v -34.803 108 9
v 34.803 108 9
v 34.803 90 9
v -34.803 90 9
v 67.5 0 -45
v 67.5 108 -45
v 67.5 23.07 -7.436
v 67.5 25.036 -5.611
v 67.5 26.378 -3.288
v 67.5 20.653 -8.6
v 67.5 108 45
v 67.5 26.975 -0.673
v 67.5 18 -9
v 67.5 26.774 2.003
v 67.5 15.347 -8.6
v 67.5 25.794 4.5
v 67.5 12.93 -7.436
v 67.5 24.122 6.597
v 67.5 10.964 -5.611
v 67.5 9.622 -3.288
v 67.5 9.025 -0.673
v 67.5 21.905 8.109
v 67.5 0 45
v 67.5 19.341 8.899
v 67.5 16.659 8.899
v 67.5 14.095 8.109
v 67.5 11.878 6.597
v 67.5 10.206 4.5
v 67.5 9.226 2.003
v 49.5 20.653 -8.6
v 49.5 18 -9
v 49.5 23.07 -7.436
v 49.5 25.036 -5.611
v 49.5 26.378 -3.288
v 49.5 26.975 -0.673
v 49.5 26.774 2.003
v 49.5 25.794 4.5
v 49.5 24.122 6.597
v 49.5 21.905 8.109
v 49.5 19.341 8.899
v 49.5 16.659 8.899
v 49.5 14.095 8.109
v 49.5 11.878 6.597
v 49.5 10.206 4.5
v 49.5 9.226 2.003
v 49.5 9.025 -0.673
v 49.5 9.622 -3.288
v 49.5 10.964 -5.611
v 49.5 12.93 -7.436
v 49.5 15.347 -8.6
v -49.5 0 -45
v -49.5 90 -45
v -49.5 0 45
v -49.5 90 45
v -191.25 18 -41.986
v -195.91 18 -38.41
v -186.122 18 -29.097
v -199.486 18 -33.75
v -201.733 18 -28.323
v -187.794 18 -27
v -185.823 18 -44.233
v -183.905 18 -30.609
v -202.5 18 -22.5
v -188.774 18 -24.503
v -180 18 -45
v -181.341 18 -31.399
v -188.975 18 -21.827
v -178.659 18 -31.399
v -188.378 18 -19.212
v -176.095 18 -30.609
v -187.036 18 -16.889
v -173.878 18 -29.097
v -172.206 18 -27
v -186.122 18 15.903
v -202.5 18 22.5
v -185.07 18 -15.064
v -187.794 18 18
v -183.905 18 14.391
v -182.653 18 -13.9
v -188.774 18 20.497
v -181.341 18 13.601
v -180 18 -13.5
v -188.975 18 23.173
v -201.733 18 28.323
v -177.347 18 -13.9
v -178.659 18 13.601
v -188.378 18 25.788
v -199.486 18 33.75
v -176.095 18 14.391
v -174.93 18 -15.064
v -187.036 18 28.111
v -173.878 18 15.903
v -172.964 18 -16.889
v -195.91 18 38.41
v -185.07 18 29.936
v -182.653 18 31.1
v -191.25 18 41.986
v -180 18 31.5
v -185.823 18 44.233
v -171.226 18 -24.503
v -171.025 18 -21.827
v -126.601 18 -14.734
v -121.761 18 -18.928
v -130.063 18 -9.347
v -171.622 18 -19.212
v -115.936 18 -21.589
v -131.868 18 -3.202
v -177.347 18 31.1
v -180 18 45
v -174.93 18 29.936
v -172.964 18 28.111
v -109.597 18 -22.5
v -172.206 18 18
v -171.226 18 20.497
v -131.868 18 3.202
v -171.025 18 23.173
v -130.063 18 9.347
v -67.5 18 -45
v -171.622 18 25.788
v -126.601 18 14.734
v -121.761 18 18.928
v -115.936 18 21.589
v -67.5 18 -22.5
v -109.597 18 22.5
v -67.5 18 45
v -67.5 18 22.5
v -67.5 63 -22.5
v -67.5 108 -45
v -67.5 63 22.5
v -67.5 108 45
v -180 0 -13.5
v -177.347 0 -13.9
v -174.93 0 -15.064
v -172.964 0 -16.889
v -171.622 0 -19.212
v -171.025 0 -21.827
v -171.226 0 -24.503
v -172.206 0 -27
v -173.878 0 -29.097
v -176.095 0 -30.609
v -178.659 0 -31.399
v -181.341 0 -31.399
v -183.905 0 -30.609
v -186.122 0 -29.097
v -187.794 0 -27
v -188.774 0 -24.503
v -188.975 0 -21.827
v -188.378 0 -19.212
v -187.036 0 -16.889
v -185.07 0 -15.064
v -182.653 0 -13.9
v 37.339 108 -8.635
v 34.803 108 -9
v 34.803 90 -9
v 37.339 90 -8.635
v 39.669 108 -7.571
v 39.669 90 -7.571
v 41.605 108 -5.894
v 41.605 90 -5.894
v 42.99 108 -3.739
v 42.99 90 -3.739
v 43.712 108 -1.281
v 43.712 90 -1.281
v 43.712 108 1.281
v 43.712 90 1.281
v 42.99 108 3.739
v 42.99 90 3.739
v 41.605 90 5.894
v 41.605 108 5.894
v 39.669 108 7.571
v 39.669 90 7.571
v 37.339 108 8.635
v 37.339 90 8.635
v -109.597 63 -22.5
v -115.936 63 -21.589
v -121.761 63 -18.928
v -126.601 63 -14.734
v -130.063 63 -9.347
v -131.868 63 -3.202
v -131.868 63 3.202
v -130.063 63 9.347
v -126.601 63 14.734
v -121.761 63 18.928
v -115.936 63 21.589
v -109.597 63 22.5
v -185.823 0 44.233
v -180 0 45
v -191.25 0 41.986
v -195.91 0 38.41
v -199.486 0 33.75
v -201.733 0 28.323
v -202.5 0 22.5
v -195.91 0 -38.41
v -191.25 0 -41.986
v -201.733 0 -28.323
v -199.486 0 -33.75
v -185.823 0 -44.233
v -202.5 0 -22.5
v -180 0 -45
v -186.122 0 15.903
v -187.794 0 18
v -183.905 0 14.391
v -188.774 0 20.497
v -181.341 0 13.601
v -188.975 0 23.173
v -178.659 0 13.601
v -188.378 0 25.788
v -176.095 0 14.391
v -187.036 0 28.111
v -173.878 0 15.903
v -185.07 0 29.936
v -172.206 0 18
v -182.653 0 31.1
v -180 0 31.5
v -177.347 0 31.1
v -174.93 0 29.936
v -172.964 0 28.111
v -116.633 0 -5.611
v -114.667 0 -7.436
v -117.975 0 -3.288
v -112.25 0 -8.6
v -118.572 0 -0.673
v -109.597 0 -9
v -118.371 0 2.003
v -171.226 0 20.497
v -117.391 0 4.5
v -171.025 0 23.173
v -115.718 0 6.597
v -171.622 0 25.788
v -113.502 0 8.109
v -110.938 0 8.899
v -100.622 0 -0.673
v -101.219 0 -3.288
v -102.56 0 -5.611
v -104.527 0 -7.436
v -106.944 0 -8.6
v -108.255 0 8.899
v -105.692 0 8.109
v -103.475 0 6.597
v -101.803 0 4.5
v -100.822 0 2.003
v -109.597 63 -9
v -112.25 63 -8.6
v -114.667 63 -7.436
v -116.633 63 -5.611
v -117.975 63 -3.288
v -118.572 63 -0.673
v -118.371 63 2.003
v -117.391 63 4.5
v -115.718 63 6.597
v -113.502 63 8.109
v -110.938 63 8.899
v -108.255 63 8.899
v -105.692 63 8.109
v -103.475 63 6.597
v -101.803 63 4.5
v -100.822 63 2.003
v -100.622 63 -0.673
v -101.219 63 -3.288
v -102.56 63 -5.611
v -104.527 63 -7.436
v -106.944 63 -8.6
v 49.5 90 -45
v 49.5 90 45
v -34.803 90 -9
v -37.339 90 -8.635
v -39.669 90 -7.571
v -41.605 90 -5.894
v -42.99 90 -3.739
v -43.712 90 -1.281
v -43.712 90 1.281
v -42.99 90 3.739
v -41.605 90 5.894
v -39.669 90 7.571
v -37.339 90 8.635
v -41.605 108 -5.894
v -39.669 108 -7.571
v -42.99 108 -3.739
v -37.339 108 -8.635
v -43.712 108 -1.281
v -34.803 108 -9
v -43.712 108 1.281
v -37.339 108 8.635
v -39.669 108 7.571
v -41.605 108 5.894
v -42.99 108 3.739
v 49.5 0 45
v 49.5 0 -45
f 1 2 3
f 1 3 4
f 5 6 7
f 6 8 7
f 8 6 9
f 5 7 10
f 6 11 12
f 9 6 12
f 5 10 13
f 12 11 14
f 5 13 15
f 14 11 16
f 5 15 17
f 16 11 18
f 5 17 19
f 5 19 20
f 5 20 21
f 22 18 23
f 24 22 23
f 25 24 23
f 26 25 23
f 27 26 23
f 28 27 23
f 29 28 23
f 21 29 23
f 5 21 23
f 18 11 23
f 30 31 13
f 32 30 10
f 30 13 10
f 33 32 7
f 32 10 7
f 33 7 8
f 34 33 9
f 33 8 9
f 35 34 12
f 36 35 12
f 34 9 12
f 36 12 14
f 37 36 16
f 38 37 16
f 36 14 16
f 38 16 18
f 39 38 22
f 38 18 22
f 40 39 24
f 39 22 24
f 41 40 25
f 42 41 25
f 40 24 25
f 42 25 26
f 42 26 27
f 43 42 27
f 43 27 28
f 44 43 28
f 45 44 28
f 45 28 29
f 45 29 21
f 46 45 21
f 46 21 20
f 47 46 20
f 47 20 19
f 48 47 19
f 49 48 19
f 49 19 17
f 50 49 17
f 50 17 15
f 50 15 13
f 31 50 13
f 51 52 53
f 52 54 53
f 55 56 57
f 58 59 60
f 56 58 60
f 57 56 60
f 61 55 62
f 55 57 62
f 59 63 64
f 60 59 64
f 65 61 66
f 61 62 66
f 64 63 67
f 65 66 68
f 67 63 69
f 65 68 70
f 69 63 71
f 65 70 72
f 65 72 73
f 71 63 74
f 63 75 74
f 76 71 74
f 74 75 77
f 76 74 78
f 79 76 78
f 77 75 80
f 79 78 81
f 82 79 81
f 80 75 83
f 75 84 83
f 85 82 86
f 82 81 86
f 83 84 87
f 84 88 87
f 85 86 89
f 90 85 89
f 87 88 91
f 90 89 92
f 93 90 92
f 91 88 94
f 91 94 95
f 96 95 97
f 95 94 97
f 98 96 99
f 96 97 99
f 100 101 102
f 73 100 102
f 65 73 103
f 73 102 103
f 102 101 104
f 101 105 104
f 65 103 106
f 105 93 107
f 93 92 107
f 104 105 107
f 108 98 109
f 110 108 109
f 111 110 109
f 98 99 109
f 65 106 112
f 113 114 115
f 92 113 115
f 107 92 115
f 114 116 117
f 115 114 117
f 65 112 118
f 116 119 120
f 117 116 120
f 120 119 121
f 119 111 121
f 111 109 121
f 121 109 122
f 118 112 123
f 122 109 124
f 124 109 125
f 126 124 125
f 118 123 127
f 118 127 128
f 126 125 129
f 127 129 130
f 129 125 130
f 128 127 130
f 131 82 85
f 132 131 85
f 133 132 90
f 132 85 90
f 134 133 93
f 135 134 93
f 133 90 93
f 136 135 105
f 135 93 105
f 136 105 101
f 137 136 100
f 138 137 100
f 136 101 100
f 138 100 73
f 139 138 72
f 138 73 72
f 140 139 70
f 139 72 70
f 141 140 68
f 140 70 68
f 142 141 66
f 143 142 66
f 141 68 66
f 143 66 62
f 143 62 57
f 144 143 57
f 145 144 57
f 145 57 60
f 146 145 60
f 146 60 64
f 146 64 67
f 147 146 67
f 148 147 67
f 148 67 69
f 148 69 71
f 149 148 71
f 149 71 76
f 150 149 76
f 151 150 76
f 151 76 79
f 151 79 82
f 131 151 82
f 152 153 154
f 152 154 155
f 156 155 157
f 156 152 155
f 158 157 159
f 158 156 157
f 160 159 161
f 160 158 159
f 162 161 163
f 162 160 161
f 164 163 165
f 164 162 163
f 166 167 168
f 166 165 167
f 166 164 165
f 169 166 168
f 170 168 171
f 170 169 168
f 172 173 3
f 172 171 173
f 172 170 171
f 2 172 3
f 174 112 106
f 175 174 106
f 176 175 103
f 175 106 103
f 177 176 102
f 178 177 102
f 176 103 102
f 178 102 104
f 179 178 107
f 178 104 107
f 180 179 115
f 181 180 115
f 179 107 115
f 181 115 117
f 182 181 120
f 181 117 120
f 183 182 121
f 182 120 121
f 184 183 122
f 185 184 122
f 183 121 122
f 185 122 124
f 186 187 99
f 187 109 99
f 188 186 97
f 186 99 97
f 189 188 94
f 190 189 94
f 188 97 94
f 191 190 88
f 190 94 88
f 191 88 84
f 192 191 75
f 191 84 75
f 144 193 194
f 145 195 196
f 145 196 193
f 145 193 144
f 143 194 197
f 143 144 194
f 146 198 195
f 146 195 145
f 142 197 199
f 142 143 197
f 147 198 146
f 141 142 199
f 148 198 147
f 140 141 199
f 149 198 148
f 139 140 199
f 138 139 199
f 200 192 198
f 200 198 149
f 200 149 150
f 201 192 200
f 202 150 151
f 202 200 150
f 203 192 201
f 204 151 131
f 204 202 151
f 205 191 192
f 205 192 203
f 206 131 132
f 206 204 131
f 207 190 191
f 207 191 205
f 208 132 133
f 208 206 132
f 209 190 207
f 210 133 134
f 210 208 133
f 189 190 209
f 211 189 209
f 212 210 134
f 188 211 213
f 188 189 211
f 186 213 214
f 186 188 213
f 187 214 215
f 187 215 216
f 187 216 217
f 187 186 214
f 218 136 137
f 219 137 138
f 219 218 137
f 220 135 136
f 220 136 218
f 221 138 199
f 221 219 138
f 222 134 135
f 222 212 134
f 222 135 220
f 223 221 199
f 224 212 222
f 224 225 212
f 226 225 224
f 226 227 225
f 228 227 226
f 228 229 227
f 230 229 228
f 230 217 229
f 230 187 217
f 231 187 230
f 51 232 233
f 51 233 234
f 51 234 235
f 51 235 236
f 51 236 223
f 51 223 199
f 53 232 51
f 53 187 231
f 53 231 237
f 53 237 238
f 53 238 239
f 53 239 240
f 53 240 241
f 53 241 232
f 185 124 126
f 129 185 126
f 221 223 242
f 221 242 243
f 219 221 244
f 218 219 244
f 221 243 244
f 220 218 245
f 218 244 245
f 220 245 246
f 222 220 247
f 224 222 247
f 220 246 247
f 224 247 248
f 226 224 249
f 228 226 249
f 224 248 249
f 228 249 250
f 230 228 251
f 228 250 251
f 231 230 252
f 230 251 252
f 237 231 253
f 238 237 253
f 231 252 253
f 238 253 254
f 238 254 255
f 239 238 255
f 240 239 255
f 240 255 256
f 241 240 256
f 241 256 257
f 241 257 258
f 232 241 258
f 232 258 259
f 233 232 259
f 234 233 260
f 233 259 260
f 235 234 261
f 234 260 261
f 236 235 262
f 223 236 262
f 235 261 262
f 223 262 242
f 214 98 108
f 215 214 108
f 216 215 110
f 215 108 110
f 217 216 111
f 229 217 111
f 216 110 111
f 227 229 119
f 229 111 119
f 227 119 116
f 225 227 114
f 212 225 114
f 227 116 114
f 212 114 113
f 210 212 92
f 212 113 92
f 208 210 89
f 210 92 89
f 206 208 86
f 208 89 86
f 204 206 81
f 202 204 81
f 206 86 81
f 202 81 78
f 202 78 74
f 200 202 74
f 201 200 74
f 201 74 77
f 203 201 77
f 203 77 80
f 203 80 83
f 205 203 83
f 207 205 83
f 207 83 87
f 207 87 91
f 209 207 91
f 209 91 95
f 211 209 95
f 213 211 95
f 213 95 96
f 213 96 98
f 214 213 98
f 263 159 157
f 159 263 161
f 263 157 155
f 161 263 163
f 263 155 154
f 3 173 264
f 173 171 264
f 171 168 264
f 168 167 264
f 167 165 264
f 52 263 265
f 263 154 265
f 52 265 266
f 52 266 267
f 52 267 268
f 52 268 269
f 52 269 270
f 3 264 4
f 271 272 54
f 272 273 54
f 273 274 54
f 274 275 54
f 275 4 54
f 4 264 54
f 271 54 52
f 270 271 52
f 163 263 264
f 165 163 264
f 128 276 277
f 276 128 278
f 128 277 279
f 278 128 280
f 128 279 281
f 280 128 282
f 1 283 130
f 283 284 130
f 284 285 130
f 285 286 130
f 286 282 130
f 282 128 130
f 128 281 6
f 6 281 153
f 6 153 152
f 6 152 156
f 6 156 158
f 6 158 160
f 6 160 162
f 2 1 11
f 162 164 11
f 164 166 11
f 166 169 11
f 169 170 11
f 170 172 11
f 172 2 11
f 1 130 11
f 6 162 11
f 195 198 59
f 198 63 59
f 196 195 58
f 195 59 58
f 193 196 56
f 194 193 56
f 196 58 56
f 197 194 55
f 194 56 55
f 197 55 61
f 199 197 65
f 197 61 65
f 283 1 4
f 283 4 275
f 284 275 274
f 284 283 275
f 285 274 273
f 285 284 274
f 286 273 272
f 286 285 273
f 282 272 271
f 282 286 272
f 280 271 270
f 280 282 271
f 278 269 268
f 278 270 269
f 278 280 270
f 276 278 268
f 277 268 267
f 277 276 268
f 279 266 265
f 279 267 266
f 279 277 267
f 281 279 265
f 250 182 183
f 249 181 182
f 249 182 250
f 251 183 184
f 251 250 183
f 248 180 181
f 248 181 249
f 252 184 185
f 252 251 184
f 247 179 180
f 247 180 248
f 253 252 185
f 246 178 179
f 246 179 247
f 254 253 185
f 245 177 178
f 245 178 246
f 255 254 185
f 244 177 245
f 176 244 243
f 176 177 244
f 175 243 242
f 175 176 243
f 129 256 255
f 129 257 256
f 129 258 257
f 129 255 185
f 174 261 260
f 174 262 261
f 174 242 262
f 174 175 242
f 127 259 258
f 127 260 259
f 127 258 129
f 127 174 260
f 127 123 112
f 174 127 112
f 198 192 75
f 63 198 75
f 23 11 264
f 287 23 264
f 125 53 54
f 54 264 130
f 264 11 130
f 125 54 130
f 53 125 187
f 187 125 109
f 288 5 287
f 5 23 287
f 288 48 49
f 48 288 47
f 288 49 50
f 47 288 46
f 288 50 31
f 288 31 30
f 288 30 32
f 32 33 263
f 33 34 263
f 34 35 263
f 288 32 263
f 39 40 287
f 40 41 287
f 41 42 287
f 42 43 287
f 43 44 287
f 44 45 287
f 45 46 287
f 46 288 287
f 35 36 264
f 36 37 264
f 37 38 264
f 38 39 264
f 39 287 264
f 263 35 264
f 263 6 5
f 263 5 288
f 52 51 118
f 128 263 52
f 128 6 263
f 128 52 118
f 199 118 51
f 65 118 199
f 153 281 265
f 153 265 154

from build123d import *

# Parameters (mm, degrees)
BOSS_EXTRUDE1_DEPTH = 45
FILLET1_R           = 22.5
SKETCH2_R           = 9
CUT_EXTRUDE1_DEPTH  = 90
SKETCH3_R           = 9
BOSS_EXTRUDE2_DEPTH = 45
SKETCH4_R           = 9
CUT_EXTRUDE2_DEPTH  = 217.795410468
CUT_EXTRUDE3_DEPTH  = 45
SKETCH6_R           = 9
CUT_EXTRUDE4_DEPTH  = 45


with BuildPart() as part:
    # Sketch1 → Boss-Extrude1 (new, symmetric)
    with BuildSketch(Plane.XY):
        Polygon((-67.5, 108), (67.5, 108), (67.5, 0), (49.5, 0), (49.5, 90), (-49.5, 90), (-49.5, 0), (-67.5, 0), (-202.5, 0), (-202.5, 18), (-67.5, 18), align=None)
    extrude(amount=BOSS_EXTRUDE1_DEPTH, both=True)

    # Fillet1
    fillet1_edges = [part.edges().sort_by_distance(p)[0] for p in [
        (-202.5, 9, -45),
        (-202.5, 9, 45),
    ]]
    fillet(fillet1_edges, radius=FILLET1_R)

    # Sketch2 → Cut-Extrude1 (cut)
    with BuildSketch(Plane(origin=(0, 18, 0), x_dir=(1, 0, 0), z_dir=(0, 1, 0))):
        with Locations(Location((-180, -22.5, 0), (0, 0, 270))):
            Circle(SKETCH2_R)
        with Locations(Location((-180, 22.5, 0), (0, 0, 270))):
            Circle(SKETCH2_R)
    extrude(amount=-CUT_EXTRUDE1_DEPTH, mode=Mode.SUBTRACT)

    # Sketch3 → Boss-Extrude2 (add)
    with BuildSketch(Plane(origin=(0, 18, 0), x_dir=(1, 0, 0), z_dir=(0, 1, 0))):
        with BuildLine():
            Line((-67.5, 22.5), (-109.596739016, 22.5))
            ThreePointArc((-109.596739016, 22.5), (-132.096739016, 0), (-109.596739016, -22.5))
            Line((-109.596739016, -22.5), (-67.5, -22.5))
            Line((-67.5, -22.5), (-67.5, 22.5))
        make_face()
        with Locations(Location((-109.596739016, 0, 0), (0, 0, 90))):
            Circle(SKETCH3_R, mode=Mode.SUBTRACT)
    extrude(amount=BOSS_EXTRUDE2_DEPTH)

    # Sketch4 → Cut-Extrude2 (cut, through all)
    with BuildSketch(Plane(origin=(0, 63, 0), x_dir=(1, 0, 0), z_dir=(0, 1, 0))):
        with Locations(Location((-109.596739016, 0, 0), (0, 0, 90))):
            Circle(SKETCH4_R)
    extrude(amount=-CUT_EXTRUDE2_DEPTH, mode=Mode.SUBTRACT)

    # Sketch5 → Cut-Extrude3 (cut)
    with BuildSketch(Plane(origin=(0, 108, 0), x_dir=(1, 0, 0), z_dir=(0, 1, 0))):
        with BuildLine():
            Line((-34.803236343, 9), (34.803236343, 9))
            ThreePointArc((34.803236343, 9), (43.803236343, 0), (34.803236343, -9))
            Line((34.803236343, -9), (-34.803236343, -9))
            ThreePointArc((-34.803236343, -9), (-43.803236343, 0), (-34.803236343, 9))
        make_face()
    extrude(amount=-CUT_EXTRUDE3_DEPTH, mode=Mode.SUBTRACT)

    # Sketch6 → Cut-Extrude4 (cut)
    with BuildSketch(Plane(origin=(67.5, 0, 0), x_dir=(0, 0, -1), z_dir=(1, 0, 0))):
        with Locations((0, 18)):
            Circle(SKETCH6_R)
    extrude(amount=-CUT_EXTRUDE4_DEPTH, mode=Mode.SUBTRACT)


solid = part.part
